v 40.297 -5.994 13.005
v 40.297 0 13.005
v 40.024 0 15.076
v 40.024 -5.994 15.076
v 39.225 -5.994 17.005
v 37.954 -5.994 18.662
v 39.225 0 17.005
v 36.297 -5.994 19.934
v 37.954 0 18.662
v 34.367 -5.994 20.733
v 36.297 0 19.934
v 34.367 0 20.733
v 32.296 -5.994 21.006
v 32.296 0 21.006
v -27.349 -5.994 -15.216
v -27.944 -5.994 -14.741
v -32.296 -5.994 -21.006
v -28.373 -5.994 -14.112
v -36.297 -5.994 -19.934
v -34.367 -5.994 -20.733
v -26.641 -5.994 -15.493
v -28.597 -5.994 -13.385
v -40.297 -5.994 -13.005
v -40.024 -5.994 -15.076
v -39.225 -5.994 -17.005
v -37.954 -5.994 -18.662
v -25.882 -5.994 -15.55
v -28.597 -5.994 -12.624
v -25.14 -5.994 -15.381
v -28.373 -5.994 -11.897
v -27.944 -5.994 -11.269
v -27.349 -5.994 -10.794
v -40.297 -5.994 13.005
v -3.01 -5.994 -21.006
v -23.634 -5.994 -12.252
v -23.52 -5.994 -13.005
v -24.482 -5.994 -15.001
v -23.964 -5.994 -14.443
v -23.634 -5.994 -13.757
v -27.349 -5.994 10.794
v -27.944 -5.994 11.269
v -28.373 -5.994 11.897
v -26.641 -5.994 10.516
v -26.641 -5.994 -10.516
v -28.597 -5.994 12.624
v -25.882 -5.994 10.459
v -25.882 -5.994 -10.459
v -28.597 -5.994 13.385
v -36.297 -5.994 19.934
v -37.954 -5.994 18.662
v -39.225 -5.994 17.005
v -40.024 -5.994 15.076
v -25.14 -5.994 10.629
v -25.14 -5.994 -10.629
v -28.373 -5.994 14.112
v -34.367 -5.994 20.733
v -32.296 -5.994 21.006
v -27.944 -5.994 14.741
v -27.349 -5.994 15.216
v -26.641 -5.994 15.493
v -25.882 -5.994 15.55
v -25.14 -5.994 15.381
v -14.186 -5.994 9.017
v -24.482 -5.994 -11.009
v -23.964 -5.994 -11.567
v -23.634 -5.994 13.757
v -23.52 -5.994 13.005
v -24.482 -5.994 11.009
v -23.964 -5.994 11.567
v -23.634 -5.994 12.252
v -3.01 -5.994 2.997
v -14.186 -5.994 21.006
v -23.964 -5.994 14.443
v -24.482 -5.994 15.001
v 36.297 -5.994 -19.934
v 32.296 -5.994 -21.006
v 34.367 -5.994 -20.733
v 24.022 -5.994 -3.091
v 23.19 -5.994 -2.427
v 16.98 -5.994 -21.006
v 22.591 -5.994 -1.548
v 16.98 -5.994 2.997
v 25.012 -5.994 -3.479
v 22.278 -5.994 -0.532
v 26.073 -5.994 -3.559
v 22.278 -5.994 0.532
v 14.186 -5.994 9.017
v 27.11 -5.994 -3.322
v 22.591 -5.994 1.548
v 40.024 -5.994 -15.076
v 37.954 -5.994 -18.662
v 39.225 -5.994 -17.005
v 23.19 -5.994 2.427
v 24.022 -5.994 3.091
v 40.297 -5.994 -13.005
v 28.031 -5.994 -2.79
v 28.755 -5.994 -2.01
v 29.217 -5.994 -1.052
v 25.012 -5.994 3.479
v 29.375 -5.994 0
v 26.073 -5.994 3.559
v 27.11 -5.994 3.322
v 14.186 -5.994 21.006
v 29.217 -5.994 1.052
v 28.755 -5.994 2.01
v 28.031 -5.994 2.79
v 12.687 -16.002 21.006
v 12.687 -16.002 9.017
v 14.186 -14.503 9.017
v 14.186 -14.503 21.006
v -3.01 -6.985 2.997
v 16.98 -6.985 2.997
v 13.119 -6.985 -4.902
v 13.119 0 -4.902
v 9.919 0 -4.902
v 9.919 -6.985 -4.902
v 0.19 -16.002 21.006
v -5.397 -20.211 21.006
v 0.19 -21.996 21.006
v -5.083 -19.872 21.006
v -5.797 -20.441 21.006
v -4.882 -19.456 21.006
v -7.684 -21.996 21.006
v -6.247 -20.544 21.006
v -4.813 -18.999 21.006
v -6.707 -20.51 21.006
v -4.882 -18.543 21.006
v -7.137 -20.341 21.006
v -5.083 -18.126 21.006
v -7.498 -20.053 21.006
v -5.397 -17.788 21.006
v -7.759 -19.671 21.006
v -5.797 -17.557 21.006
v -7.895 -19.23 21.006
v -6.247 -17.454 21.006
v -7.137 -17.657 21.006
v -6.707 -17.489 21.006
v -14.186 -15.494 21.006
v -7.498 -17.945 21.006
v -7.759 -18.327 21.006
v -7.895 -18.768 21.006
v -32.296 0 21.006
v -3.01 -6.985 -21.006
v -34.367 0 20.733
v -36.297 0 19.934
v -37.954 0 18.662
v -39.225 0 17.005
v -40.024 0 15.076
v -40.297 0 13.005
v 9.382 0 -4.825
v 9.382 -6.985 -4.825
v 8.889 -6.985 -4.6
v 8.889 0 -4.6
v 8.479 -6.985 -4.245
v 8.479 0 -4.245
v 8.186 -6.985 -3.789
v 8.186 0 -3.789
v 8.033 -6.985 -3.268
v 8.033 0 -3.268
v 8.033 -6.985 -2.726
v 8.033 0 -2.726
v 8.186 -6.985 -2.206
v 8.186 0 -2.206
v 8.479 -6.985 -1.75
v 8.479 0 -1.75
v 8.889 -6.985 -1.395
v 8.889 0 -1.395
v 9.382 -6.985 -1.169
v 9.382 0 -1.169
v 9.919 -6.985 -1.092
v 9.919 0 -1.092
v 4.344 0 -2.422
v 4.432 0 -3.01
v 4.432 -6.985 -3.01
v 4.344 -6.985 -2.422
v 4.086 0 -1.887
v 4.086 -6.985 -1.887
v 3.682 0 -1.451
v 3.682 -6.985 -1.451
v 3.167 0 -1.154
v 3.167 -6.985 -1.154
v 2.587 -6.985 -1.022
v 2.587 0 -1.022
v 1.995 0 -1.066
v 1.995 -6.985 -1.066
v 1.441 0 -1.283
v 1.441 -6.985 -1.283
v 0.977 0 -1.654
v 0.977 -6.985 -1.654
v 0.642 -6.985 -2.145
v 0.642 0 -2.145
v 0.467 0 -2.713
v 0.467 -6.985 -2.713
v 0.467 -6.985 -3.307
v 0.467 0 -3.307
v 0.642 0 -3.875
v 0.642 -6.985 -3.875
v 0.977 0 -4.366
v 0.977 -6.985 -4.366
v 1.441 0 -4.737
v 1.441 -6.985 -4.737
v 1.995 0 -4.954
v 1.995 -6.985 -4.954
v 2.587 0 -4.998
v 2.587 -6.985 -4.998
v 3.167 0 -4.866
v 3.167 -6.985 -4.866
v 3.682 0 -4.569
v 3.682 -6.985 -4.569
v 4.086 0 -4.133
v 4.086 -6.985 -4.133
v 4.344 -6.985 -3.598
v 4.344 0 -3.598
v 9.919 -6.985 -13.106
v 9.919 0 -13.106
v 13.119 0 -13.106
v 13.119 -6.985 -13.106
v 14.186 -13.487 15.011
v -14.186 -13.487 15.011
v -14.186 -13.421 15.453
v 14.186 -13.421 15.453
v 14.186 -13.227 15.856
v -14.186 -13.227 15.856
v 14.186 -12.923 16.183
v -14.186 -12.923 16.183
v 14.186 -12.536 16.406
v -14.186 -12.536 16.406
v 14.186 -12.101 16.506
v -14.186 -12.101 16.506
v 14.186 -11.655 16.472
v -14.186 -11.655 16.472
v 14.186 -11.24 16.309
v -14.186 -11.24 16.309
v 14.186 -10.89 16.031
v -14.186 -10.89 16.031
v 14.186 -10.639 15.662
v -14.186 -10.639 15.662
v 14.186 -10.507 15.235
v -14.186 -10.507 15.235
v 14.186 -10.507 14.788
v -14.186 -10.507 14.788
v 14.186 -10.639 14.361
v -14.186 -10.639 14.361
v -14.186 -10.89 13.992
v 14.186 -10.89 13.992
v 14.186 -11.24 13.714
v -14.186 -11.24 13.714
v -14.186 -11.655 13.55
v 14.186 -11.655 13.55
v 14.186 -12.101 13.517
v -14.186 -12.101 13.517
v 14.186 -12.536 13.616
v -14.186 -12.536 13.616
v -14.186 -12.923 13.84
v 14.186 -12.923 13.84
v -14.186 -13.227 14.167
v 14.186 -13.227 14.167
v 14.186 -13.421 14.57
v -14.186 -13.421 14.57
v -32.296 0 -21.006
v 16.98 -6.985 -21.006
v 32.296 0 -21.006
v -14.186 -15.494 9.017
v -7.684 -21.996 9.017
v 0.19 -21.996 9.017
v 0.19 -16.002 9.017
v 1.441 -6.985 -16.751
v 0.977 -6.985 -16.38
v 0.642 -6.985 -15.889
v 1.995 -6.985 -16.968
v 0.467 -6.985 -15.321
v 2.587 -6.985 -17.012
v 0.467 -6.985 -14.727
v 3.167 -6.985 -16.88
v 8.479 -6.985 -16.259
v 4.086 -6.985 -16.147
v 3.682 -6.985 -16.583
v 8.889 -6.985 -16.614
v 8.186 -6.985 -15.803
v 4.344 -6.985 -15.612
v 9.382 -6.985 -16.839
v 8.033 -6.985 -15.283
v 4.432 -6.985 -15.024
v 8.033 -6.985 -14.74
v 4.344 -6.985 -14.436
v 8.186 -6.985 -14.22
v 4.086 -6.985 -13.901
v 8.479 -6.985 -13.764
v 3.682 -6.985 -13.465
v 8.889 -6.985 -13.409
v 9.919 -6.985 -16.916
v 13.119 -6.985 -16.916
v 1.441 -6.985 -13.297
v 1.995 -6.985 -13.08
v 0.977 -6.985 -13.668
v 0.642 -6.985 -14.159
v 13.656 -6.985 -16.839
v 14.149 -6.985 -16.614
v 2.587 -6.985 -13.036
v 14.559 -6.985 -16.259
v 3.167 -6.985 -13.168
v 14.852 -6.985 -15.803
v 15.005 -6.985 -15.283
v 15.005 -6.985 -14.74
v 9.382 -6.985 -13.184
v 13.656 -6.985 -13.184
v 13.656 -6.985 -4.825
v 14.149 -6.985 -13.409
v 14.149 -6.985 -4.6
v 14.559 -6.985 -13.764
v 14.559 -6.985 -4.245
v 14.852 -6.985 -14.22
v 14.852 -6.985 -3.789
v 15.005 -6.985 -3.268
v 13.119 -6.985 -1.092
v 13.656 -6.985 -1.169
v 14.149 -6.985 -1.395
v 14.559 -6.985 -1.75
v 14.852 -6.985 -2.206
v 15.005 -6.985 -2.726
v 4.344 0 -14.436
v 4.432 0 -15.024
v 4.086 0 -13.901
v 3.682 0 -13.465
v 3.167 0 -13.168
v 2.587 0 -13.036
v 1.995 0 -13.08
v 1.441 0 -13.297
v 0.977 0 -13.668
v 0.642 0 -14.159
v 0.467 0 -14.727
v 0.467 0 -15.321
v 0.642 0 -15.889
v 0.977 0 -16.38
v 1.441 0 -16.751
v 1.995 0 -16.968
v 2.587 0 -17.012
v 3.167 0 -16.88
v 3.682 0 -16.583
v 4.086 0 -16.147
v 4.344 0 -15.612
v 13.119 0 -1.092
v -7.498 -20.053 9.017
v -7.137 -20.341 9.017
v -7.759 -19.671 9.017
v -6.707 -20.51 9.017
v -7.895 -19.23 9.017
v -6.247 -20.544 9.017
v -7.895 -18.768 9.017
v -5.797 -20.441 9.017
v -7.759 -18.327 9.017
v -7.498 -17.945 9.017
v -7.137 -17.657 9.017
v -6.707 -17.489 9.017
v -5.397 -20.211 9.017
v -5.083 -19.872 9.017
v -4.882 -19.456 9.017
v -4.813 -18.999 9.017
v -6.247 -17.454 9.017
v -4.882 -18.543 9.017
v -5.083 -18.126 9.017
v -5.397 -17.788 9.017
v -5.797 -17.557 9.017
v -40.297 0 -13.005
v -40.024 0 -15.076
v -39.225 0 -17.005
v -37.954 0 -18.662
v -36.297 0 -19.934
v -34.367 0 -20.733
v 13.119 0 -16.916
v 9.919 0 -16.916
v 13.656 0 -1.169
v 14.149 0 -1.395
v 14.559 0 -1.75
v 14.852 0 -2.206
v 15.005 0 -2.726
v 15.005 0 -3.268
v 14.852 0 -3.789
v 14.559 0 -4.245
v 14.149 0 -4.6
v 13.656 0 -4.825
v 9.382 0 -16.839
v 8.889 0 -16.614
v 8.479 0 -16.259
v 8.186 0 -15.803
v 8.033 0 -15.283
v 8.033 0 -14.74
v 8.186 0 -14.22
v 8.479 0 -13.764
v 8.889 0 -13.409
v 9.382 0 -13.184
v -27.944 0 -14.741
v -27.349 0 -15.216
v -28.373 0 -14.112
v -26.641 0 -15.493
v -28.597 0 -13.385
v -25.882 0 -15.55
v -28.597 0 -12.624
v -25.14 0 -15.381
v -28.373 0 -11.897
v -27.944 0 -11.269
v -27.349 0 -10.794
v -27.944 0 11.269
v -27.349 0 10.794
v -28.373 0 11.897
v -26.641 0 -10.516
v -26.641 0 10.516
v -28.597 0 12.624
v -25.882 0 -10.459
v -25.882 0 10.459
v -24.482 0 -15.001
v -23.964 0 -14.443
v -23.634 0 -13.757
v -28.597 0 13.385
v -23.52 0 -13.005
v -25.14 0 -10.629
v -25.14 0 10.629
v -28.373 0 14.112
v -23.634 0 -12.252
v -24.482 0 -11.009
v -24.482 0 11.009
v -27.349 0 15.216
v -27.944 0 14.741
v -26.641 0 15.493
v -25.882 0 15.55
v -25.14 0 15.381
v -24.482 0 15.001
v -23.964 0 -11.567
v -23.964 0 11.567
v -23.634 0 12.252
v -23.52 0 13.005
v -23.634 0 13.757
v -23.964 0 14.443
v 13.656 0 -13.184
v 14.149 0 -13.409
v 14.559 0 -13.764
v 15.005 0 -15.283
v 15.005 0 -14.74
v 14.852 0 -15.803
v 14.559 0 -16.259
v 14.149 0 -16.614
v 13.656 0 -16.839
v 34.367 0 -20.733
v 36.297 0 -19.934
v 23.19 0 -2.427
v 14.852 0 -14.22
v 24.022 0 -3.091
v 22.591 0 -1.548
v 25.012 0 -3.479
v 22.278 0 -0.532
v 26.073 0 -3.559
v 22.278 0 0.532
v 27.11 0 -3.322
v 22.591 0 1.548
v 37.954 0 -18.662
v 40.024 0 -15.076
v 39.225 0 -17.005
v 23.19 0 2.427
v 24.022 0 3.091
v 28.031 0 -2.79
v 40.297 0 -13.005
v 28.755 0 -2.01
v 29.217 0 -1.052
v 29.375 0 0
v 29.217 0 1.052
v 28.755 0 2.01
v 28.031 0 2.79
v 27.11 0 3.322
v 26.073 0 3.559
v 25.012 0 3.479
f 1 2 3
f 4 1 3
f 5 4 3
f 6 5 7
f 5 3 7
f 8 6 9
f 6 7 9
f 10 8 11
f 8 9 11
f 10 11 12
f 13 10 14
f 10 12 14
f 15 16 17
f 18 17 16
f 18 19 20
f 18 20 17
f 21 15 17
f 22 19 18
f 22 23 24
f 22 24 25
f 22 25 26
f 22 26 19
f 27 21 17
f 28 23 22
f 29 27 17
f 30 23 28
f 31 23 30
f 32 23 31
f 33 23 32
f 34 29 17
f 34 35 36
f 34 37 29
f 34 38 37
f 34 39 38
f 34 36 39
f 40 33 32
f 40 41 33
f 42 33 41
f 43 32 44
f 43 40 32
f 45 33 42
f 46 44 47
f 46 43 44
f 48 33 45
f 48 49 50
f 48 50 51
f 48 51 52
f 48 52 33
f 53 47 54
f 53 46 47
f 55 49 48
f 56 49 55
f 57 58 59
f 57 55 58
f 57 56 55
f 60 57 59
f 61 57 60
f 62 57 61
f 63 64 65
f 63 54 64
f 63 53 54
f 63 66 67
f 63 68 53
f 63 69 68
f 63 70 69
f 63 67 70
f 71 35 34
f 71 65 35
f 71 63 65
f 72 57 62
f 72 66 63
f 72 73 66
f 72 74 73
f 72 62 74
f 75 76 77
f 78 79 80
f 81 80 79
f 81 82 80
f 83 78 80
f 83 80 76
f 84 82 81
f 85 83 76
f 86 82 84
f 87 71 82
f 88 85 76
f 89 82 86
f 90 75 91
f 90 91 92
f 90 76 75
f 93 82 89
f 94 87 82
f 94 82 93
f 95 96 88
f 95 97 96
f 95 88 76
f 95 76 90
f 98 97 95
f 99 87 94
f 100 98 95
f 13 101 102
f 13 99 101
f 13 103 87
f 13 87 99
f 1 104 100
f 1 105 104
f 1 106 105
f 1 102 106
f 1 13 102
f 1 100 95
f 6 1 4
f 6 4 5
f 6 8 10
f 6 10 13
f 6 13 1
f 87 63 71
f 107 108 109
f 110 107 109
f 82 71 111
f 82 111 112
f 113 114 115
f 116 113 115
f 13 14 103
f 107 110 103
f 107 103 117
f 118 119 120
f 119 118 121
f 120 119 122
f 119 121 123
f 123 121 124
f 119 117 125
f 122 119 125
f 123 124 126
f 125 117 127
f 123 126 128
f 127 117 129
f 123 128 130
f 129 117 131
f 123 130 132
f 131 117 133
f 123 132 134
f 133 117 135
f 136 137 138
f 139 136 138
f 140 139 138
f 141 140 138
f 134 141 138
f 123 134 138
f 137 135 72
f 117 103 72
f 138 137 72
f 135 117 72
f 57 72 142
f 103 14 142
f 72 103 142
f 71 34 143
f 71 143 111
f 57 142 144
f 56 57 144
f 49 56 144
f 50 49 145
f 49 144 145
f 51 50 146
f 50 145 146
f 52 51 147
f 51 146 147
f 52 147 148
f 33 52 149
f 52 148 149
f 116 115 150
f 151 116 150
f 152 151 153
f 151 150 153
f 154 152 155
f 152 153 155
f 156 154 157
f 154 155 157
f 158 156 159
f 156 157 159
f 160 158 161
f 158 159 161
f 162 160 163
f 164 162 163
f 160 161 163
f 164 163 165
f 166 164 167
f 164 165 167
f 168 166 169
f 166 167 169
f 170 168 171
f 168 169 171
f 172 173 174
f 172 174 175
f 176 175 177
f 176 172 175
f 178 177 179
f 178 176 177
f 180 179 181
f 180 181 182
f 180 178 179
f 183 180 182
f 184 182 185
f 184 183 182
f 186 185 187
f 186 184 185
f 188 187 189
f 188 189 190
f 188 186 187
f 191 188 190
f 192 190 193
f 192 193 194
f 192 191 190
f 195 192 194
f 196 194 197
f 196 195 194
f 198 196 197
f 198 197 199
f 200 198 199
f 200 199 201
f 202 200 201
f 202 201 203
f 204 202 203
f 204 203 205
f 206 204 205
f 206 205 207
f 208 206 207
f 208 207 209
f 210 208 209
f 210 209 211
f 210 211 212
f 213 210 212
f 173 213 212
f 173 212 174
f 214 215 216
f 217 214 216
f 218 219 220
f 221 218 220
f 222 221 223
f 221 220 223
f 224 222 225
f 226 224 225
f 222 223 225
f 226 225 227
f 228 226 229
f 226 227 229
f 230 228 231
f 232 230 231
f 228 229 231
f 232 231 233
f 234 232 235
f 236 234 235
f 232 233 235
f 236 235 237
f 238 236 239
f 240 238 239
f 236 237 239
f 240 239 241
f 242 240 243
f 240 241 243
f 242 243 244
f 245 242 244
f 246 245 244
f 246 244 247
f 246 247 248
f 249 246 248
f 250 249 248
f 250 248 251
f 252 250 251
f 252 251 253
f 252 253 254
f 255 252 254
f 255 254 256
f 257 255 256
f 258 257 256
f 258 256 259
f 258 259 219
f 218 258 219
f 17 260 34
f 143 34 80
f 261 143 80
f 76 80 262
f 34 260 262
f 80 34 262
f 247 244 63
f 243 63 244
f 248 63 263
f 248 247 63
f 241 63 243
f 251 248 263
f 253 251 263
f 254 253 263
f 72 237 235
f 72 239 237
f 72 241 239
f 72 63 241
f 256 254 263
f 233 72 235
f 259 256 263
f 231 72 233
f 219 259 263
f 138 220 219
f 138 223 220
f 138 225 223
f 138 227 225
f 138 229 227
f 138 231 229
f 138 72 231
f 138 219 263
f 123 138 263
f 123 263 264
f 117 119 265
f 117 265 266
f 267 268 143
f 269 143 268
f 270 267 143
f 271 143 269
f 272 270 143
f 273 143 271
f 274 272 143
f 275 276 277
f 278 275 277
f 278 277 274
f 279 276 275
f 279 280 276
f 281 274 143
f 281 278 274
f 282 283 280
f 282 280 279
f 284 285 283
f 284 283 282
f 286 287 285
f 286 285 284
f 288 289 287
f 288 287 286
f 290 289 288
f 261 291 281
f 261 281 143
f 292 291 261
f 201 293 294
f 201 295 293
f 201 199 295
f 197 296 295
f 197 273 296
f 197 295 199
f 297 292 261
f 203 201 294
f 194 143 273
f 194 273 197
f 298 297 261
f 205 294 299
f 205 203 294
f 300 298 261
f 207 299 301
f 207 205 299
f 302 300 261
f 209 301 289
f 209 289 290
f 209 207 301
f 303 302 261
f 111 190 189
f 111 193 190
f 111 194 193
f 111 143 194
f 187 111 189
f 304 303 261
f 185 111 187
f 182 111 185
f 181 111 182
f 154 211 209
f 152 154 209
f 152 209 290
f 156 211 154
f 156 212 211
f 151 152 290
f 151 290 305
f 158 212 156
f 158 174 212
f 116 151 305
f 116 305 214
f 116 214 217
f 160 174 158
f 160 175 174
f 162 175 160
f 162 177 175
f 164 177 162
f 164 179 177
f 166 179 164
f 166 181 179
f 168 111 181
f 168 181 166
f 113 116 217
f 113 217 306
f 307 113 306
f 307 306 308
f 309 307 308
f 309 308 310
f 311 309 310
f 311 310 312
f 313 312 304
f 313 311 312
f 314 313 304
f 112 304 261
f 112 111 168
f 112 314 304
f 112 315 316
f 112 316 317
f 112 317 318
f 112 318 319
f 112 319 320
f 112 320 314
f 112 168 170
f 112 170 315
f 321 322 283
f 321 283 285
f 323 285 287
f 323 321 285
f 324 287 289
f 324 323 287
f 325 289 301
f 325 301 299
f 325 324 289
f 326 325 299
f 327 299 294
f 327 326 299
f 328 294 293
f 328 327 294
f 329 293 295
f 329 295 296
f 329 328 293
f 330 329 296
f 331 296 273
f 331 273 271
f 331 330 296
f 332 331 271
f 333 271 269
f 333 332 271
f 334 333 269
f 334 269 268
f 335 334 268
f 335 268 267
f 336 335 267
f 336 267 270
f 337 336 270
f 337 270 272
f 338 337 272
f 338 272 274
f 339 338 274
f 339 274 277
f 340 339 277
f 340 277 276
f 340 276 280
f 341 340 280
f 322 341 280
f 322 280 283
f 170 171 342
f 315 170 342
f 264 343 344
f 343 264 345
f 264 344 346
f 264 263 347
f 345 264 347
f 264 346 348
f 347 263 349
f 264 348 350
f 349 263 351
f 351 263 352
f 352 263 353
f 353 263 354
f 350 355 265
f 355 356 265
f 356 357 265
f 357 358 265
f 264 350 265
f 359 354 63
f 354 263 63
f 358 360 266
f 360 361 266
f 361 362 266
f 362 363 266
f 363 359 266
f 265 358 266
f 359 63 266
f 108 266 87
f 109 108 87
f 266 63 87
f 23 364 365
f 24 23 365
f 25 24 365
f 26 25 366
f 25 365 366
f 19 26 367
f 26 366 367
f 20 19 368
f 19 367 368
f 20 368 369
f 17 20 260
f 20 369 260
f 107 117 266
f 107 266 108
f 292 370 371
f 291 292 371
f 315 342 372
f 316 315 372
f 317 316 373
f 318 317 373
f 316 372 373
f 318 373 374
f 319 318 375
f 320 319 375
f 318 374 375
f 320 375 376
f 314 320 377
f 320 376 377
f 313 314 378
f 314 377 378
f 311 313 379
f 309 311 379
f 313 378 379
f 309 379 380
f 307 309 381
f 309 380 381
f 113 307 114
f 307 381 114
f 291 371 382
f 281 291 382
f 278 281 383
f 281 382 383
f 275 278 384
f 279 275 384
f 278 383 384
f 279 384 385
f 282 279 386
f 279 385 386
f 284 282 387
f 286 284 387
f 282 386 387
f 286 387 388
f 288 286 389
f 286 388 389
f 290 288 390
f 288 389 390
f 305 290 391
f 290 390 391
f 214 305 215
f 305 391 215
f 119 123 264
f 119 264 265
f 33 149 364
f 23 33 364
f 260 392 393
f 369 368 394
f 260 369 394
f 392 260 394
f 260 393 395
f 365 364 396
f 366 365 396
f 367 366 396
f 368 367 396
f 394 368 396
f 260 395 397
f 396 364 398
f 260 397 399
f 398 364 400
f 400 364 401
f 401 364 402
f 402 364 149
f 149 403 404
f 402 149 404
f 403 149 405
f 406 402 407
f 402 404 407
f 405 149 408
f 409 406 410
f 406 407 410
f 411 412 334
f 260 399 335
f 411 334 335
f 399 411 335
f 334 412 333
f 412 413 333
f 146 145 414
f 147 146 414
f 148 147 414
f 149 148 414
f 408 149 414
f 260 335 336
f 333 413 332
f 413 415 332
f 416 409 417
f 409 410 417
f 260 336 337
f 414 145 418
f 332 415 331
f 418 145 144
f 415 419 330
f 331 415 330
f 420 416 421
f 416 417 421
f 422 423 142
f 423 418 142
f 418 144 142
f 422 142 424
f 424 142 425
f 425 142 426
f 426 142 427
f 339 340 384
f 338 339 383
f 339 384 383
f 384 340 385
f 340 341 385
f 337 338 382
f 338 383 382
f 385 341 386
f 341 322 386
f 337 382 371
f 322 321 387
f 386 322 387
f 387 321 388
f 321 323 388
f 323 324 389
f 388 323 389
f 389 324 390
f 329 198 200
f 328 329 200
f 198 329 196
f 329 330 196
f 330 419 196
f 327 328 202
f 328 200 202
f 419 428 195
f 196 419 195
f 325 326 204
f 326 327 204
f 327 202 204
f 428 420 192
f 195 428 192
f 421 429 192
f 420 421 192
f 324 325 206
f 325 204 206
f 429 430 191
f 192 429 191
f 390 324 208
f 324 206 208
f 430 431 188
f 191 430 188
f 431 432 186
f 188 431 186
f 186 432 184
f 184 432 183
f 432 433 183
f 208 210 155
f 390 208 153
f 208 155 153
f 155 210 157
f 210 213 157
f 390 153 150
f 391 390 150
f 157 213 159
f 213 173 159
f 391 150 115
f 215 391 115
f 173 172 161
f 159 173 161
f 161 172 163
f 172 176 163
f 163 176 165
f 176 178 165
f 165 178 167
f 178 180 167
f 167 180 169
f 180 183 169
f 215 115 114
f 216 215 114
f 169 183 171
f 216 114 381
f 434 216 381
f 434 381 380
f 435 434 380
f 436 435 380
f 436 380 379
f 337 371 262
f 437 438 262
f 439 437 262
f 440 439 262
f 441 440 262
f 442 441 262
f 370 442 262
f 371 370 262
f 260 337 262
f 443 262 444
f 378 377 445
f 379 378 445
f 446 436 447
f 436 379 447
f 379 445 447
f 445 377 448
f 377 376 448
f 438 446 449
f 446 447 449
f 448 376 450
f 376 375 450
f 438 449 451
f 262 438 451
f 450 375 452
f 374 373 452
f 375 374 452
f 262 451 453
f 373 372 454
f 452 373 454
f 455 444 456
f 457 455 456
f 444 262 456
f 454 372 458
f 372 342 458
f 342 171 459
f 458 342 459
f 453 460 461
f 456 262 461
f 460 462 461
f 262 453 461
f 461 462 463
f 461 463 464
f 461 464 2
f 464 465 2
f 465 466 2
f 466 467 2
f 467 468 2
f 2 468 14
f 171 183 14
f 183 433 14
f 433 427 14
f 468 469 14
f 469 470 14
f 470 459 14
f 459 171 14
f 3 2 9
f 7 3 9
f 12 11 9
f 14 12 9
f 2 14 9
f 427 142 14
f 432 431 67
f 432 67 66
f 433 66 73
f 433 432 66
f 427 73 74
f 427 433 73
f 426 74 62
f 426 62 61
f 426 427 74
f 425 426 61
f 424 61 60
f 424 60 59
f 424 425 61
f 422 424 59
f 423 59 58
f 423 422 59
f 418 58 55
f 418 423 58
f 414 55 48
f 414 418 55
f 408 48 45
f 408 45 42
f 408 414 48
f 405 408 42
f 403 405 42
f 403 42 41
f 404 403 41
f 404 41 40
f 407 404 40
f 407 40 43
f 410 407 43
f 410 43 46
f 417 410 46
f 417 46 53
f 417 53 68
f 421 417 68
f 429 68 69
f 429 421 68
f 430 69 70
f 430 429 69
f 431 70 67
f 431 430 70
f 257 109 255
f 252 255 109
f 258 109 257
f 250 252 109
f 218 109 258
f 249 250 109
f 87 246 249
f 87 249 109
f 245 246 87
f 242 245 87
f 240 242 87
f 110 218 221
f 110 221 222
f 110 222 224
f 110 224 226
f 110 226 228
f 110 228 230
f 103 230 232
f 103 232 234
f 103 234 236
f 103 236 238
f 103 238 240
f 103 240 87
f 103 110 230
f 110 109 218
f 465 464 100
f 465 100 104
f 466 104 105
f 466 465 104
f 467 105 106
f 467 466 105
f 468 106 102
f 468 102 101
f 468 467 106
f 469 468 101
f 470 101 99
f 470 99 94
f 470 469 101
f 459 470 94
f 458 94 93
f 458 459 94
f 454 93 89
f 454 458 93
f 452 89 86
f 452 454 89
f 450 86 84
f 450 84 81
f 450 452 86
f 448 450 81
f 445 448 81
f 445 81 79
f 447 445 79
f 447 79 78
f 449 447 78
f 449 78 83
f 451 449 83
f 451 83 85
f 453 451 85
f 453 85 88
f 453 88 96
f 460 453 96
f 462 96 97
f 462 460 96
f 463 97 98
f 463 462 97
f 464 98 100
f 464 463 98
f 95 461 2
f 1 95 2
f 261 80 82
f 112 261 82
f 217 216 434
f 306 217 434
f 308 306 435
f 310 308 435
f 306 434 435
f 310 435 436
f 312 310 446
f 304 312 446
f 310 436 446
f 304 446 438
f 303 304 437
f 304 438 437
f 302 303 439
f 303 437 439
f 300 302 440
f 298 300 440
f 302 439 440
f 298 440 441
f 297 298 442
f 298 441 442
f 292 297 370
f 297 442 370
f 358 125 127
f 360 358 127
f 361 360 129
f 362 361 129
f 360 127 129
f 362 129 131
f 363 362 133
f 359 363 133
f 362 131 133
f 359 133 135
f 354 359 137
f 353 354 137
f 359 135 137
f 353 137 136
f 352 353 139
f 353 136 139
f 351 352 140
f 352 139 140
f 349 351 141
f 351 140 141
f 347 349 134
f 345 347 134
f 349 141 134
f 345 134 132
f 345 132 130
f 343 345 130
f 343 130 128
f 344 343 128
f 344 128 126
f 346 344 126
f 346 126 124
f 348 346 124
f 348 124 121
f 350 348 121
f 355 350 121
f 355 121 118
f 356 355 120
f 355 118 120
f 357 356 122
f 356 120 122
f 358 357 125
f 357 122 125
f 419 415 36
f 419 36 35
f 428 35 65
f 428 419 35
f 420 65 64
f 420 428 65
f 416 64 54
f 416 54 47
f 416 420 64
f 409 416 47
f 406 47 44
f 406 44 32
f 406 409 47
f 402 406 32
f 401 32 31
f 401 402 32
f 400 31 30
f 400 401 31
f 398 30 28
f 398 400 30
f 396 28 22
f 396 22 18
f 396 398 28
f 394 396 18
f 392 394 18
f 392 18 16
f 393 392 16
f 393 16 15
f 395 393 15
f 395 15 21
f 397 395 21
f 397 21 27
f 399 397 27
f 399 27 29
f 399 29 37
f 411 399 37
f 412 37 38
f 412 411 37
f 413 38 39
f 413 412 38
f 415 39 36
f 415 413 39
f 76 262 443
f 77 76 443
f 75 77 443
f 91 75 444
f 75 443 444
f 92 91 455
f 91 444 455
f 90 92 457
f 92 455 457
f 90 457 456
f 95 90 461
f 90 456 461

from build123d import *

# Parameters (mm, degrees)
F0_R     = 2.5527
F0_R_2   = 1.9939
F0_R_3   = 3.5687
F1_DEPTH = 5.9944
F2_W     = 19.9898
F2_H     = 24.003
F2_R     = 1.9939
F3_DEPTH = 6.985
F4_R     = 1.5494
F5_DEPTH = 11.9888
F7_D     = 2.9972


with BuildPart() as f1:
    # F0 (on Front) → F1 (new body)
    with BuildSketch(Plane.XZ):
        with BuildLine():
            ThreePointArc((40.2971, 13.0048), (37.9536613563, 18.6623613563), (32.2961, 21.0058))
            Line((32.2961, 21.0058), (-32.2961, 21.0058))
            ThreePointArc((-32.2961, 21.0058), (-37.9536613563, 18.6623613563), (-40.2971, 13.0048))
            Line((-40.2971, 13.0048), (-40.2971, -13.0048))
            ThreePointArc((-40.2971, -13.0048), (-37.9536613563, -18.6623613563), (-32.2961, -21.0058))
            Line((-32.2961, -21.0058), (32.2961, -21.0058))
            ThreePointArc((32.2961, -21.0058), (37.9536613563, -18.6623613563), (40.2971, -13.0048))
            Line((40.2971, -13.0048), (40.2971, 13.0048))
        make_face()
        with Locations((-26.0731, -13.0048)):
            Circle(F0_R, mode=Mode.SUBTRACT)
        with Locations((2.438410781, -15.0241)):
            Circle(F0_R_2, mode=Mode.SUBTRACT)
        with BuildLine():
            Line((13.1191, -16.9164), (9.9187, -16.9164))
            ThreePointArc((9.9187, -16.9164), (8.0137, -15.0114), (9.9187, -13.1064))
            Line((9.9187, -13.1064), (13.1191, -13.1064))
            ThreePointArc((13.1191, -13.1064), (15.0241, -15.0114), (13.1191, -16.9164))
        make_face(mode=Mode.SUBTRACT)
        with Locations((2.438410781, -3.0099)):
            Circle(F0_R_2, mode=Mode.SUBTRACT)
        with BuildLine():
            Line((13.1191, -4.9022), (9.9187, -4.9022))
            ThreePointArc((9.9187, -4.9022), (8.0137, -2.9972), (9.9187, -1.0922))
            Line((9.9187, -1.0922), (13.1191, -1.0922))
            ThreePointArc((13.1191, -1.0922), (15.0241, -2.9972), (13.1191, -4.9022))
        make_face(mode=Mode.SUBTRACT)
        with Locations((-26.0731, 13.0048)):
            Circle(F0_R, mode=Mode.SUBTRACT)
        with Locations((25.8064, 0)):
            Circle(F0_R_3, mode=Mode.SUBTRACT)
    extrude(amount=F1_DEPTH)

    # F2 (on Front) → F3 (join)
    with BuildSketch(Plane.XZ):
        with Locations((6.985, -9.0043)):
            Rectangle(F2_W, F2_H)
        with Locations((2.438410781, -15.0241)):
            Circle(F2_R, mode=Mode.SUBTRACT)
        with BuildLine():
            Line((13.1191, -16.9164), (9.9187, -16.9164))
            ThreePointArc((9.9187, -16.9164), (8.0137, -15.0114), (9.9187, -13.1064))
            Line((9.9187, -13.1064), (13.1191, -13.1064))
            ThreePointArc((13.1191, -13.1064), (15.0241, -15.0114), (13.1191, -16.9164))
        make_face(mode=Mode.SUBTRACT)
        with Locations((2.438410781, -3.0099)):
            Circle(F2_R, mode=Mode.SUBTRACT)
        with BuildLine():
            Line((13.1191, -4.9022), (9.9187, -4.9022))
            ThreePointArc((9.9187, -4.9022), (8.0137, -2.9972), (9.9187, -1.0922))
            Line((9.9187, -1.0922), (13.1191, -1.0922))
            ThreePointArc((13.1191, -1.0922), (15.0241, -2.9972), (13.1191, -4.9022))
        make_face(mode=Mode.SUBTRACT)
    extrude(amount=F3_DEPTH)

    # F4 (on face) → F5 (join)
    with BuildSketch(Plane.XY.offset(21.0058)):
        Polygon((14.1859, -5.9944), (-14.1859, -5.9944), (-14.1859, -15.494), (-7.6835, -21.9964), (0.1905, -21.9964), (0.1905, -16.002), (12.6873, -16.002), (14.1859, -14.5034), align=None)
        with Locations((-6.3627, -18.9992)):
            Circle(F4_R, mode=Mode.SUBTRACT)
    extrude(amount=-F5_DEPTH)

    # F7 (through all)
    with Locations(Plane.YZ.offset(14.1859)):
        with Locations((-11.9888, 15.0114)):
            Hole(F7_D / 2)


solid = f1.part
